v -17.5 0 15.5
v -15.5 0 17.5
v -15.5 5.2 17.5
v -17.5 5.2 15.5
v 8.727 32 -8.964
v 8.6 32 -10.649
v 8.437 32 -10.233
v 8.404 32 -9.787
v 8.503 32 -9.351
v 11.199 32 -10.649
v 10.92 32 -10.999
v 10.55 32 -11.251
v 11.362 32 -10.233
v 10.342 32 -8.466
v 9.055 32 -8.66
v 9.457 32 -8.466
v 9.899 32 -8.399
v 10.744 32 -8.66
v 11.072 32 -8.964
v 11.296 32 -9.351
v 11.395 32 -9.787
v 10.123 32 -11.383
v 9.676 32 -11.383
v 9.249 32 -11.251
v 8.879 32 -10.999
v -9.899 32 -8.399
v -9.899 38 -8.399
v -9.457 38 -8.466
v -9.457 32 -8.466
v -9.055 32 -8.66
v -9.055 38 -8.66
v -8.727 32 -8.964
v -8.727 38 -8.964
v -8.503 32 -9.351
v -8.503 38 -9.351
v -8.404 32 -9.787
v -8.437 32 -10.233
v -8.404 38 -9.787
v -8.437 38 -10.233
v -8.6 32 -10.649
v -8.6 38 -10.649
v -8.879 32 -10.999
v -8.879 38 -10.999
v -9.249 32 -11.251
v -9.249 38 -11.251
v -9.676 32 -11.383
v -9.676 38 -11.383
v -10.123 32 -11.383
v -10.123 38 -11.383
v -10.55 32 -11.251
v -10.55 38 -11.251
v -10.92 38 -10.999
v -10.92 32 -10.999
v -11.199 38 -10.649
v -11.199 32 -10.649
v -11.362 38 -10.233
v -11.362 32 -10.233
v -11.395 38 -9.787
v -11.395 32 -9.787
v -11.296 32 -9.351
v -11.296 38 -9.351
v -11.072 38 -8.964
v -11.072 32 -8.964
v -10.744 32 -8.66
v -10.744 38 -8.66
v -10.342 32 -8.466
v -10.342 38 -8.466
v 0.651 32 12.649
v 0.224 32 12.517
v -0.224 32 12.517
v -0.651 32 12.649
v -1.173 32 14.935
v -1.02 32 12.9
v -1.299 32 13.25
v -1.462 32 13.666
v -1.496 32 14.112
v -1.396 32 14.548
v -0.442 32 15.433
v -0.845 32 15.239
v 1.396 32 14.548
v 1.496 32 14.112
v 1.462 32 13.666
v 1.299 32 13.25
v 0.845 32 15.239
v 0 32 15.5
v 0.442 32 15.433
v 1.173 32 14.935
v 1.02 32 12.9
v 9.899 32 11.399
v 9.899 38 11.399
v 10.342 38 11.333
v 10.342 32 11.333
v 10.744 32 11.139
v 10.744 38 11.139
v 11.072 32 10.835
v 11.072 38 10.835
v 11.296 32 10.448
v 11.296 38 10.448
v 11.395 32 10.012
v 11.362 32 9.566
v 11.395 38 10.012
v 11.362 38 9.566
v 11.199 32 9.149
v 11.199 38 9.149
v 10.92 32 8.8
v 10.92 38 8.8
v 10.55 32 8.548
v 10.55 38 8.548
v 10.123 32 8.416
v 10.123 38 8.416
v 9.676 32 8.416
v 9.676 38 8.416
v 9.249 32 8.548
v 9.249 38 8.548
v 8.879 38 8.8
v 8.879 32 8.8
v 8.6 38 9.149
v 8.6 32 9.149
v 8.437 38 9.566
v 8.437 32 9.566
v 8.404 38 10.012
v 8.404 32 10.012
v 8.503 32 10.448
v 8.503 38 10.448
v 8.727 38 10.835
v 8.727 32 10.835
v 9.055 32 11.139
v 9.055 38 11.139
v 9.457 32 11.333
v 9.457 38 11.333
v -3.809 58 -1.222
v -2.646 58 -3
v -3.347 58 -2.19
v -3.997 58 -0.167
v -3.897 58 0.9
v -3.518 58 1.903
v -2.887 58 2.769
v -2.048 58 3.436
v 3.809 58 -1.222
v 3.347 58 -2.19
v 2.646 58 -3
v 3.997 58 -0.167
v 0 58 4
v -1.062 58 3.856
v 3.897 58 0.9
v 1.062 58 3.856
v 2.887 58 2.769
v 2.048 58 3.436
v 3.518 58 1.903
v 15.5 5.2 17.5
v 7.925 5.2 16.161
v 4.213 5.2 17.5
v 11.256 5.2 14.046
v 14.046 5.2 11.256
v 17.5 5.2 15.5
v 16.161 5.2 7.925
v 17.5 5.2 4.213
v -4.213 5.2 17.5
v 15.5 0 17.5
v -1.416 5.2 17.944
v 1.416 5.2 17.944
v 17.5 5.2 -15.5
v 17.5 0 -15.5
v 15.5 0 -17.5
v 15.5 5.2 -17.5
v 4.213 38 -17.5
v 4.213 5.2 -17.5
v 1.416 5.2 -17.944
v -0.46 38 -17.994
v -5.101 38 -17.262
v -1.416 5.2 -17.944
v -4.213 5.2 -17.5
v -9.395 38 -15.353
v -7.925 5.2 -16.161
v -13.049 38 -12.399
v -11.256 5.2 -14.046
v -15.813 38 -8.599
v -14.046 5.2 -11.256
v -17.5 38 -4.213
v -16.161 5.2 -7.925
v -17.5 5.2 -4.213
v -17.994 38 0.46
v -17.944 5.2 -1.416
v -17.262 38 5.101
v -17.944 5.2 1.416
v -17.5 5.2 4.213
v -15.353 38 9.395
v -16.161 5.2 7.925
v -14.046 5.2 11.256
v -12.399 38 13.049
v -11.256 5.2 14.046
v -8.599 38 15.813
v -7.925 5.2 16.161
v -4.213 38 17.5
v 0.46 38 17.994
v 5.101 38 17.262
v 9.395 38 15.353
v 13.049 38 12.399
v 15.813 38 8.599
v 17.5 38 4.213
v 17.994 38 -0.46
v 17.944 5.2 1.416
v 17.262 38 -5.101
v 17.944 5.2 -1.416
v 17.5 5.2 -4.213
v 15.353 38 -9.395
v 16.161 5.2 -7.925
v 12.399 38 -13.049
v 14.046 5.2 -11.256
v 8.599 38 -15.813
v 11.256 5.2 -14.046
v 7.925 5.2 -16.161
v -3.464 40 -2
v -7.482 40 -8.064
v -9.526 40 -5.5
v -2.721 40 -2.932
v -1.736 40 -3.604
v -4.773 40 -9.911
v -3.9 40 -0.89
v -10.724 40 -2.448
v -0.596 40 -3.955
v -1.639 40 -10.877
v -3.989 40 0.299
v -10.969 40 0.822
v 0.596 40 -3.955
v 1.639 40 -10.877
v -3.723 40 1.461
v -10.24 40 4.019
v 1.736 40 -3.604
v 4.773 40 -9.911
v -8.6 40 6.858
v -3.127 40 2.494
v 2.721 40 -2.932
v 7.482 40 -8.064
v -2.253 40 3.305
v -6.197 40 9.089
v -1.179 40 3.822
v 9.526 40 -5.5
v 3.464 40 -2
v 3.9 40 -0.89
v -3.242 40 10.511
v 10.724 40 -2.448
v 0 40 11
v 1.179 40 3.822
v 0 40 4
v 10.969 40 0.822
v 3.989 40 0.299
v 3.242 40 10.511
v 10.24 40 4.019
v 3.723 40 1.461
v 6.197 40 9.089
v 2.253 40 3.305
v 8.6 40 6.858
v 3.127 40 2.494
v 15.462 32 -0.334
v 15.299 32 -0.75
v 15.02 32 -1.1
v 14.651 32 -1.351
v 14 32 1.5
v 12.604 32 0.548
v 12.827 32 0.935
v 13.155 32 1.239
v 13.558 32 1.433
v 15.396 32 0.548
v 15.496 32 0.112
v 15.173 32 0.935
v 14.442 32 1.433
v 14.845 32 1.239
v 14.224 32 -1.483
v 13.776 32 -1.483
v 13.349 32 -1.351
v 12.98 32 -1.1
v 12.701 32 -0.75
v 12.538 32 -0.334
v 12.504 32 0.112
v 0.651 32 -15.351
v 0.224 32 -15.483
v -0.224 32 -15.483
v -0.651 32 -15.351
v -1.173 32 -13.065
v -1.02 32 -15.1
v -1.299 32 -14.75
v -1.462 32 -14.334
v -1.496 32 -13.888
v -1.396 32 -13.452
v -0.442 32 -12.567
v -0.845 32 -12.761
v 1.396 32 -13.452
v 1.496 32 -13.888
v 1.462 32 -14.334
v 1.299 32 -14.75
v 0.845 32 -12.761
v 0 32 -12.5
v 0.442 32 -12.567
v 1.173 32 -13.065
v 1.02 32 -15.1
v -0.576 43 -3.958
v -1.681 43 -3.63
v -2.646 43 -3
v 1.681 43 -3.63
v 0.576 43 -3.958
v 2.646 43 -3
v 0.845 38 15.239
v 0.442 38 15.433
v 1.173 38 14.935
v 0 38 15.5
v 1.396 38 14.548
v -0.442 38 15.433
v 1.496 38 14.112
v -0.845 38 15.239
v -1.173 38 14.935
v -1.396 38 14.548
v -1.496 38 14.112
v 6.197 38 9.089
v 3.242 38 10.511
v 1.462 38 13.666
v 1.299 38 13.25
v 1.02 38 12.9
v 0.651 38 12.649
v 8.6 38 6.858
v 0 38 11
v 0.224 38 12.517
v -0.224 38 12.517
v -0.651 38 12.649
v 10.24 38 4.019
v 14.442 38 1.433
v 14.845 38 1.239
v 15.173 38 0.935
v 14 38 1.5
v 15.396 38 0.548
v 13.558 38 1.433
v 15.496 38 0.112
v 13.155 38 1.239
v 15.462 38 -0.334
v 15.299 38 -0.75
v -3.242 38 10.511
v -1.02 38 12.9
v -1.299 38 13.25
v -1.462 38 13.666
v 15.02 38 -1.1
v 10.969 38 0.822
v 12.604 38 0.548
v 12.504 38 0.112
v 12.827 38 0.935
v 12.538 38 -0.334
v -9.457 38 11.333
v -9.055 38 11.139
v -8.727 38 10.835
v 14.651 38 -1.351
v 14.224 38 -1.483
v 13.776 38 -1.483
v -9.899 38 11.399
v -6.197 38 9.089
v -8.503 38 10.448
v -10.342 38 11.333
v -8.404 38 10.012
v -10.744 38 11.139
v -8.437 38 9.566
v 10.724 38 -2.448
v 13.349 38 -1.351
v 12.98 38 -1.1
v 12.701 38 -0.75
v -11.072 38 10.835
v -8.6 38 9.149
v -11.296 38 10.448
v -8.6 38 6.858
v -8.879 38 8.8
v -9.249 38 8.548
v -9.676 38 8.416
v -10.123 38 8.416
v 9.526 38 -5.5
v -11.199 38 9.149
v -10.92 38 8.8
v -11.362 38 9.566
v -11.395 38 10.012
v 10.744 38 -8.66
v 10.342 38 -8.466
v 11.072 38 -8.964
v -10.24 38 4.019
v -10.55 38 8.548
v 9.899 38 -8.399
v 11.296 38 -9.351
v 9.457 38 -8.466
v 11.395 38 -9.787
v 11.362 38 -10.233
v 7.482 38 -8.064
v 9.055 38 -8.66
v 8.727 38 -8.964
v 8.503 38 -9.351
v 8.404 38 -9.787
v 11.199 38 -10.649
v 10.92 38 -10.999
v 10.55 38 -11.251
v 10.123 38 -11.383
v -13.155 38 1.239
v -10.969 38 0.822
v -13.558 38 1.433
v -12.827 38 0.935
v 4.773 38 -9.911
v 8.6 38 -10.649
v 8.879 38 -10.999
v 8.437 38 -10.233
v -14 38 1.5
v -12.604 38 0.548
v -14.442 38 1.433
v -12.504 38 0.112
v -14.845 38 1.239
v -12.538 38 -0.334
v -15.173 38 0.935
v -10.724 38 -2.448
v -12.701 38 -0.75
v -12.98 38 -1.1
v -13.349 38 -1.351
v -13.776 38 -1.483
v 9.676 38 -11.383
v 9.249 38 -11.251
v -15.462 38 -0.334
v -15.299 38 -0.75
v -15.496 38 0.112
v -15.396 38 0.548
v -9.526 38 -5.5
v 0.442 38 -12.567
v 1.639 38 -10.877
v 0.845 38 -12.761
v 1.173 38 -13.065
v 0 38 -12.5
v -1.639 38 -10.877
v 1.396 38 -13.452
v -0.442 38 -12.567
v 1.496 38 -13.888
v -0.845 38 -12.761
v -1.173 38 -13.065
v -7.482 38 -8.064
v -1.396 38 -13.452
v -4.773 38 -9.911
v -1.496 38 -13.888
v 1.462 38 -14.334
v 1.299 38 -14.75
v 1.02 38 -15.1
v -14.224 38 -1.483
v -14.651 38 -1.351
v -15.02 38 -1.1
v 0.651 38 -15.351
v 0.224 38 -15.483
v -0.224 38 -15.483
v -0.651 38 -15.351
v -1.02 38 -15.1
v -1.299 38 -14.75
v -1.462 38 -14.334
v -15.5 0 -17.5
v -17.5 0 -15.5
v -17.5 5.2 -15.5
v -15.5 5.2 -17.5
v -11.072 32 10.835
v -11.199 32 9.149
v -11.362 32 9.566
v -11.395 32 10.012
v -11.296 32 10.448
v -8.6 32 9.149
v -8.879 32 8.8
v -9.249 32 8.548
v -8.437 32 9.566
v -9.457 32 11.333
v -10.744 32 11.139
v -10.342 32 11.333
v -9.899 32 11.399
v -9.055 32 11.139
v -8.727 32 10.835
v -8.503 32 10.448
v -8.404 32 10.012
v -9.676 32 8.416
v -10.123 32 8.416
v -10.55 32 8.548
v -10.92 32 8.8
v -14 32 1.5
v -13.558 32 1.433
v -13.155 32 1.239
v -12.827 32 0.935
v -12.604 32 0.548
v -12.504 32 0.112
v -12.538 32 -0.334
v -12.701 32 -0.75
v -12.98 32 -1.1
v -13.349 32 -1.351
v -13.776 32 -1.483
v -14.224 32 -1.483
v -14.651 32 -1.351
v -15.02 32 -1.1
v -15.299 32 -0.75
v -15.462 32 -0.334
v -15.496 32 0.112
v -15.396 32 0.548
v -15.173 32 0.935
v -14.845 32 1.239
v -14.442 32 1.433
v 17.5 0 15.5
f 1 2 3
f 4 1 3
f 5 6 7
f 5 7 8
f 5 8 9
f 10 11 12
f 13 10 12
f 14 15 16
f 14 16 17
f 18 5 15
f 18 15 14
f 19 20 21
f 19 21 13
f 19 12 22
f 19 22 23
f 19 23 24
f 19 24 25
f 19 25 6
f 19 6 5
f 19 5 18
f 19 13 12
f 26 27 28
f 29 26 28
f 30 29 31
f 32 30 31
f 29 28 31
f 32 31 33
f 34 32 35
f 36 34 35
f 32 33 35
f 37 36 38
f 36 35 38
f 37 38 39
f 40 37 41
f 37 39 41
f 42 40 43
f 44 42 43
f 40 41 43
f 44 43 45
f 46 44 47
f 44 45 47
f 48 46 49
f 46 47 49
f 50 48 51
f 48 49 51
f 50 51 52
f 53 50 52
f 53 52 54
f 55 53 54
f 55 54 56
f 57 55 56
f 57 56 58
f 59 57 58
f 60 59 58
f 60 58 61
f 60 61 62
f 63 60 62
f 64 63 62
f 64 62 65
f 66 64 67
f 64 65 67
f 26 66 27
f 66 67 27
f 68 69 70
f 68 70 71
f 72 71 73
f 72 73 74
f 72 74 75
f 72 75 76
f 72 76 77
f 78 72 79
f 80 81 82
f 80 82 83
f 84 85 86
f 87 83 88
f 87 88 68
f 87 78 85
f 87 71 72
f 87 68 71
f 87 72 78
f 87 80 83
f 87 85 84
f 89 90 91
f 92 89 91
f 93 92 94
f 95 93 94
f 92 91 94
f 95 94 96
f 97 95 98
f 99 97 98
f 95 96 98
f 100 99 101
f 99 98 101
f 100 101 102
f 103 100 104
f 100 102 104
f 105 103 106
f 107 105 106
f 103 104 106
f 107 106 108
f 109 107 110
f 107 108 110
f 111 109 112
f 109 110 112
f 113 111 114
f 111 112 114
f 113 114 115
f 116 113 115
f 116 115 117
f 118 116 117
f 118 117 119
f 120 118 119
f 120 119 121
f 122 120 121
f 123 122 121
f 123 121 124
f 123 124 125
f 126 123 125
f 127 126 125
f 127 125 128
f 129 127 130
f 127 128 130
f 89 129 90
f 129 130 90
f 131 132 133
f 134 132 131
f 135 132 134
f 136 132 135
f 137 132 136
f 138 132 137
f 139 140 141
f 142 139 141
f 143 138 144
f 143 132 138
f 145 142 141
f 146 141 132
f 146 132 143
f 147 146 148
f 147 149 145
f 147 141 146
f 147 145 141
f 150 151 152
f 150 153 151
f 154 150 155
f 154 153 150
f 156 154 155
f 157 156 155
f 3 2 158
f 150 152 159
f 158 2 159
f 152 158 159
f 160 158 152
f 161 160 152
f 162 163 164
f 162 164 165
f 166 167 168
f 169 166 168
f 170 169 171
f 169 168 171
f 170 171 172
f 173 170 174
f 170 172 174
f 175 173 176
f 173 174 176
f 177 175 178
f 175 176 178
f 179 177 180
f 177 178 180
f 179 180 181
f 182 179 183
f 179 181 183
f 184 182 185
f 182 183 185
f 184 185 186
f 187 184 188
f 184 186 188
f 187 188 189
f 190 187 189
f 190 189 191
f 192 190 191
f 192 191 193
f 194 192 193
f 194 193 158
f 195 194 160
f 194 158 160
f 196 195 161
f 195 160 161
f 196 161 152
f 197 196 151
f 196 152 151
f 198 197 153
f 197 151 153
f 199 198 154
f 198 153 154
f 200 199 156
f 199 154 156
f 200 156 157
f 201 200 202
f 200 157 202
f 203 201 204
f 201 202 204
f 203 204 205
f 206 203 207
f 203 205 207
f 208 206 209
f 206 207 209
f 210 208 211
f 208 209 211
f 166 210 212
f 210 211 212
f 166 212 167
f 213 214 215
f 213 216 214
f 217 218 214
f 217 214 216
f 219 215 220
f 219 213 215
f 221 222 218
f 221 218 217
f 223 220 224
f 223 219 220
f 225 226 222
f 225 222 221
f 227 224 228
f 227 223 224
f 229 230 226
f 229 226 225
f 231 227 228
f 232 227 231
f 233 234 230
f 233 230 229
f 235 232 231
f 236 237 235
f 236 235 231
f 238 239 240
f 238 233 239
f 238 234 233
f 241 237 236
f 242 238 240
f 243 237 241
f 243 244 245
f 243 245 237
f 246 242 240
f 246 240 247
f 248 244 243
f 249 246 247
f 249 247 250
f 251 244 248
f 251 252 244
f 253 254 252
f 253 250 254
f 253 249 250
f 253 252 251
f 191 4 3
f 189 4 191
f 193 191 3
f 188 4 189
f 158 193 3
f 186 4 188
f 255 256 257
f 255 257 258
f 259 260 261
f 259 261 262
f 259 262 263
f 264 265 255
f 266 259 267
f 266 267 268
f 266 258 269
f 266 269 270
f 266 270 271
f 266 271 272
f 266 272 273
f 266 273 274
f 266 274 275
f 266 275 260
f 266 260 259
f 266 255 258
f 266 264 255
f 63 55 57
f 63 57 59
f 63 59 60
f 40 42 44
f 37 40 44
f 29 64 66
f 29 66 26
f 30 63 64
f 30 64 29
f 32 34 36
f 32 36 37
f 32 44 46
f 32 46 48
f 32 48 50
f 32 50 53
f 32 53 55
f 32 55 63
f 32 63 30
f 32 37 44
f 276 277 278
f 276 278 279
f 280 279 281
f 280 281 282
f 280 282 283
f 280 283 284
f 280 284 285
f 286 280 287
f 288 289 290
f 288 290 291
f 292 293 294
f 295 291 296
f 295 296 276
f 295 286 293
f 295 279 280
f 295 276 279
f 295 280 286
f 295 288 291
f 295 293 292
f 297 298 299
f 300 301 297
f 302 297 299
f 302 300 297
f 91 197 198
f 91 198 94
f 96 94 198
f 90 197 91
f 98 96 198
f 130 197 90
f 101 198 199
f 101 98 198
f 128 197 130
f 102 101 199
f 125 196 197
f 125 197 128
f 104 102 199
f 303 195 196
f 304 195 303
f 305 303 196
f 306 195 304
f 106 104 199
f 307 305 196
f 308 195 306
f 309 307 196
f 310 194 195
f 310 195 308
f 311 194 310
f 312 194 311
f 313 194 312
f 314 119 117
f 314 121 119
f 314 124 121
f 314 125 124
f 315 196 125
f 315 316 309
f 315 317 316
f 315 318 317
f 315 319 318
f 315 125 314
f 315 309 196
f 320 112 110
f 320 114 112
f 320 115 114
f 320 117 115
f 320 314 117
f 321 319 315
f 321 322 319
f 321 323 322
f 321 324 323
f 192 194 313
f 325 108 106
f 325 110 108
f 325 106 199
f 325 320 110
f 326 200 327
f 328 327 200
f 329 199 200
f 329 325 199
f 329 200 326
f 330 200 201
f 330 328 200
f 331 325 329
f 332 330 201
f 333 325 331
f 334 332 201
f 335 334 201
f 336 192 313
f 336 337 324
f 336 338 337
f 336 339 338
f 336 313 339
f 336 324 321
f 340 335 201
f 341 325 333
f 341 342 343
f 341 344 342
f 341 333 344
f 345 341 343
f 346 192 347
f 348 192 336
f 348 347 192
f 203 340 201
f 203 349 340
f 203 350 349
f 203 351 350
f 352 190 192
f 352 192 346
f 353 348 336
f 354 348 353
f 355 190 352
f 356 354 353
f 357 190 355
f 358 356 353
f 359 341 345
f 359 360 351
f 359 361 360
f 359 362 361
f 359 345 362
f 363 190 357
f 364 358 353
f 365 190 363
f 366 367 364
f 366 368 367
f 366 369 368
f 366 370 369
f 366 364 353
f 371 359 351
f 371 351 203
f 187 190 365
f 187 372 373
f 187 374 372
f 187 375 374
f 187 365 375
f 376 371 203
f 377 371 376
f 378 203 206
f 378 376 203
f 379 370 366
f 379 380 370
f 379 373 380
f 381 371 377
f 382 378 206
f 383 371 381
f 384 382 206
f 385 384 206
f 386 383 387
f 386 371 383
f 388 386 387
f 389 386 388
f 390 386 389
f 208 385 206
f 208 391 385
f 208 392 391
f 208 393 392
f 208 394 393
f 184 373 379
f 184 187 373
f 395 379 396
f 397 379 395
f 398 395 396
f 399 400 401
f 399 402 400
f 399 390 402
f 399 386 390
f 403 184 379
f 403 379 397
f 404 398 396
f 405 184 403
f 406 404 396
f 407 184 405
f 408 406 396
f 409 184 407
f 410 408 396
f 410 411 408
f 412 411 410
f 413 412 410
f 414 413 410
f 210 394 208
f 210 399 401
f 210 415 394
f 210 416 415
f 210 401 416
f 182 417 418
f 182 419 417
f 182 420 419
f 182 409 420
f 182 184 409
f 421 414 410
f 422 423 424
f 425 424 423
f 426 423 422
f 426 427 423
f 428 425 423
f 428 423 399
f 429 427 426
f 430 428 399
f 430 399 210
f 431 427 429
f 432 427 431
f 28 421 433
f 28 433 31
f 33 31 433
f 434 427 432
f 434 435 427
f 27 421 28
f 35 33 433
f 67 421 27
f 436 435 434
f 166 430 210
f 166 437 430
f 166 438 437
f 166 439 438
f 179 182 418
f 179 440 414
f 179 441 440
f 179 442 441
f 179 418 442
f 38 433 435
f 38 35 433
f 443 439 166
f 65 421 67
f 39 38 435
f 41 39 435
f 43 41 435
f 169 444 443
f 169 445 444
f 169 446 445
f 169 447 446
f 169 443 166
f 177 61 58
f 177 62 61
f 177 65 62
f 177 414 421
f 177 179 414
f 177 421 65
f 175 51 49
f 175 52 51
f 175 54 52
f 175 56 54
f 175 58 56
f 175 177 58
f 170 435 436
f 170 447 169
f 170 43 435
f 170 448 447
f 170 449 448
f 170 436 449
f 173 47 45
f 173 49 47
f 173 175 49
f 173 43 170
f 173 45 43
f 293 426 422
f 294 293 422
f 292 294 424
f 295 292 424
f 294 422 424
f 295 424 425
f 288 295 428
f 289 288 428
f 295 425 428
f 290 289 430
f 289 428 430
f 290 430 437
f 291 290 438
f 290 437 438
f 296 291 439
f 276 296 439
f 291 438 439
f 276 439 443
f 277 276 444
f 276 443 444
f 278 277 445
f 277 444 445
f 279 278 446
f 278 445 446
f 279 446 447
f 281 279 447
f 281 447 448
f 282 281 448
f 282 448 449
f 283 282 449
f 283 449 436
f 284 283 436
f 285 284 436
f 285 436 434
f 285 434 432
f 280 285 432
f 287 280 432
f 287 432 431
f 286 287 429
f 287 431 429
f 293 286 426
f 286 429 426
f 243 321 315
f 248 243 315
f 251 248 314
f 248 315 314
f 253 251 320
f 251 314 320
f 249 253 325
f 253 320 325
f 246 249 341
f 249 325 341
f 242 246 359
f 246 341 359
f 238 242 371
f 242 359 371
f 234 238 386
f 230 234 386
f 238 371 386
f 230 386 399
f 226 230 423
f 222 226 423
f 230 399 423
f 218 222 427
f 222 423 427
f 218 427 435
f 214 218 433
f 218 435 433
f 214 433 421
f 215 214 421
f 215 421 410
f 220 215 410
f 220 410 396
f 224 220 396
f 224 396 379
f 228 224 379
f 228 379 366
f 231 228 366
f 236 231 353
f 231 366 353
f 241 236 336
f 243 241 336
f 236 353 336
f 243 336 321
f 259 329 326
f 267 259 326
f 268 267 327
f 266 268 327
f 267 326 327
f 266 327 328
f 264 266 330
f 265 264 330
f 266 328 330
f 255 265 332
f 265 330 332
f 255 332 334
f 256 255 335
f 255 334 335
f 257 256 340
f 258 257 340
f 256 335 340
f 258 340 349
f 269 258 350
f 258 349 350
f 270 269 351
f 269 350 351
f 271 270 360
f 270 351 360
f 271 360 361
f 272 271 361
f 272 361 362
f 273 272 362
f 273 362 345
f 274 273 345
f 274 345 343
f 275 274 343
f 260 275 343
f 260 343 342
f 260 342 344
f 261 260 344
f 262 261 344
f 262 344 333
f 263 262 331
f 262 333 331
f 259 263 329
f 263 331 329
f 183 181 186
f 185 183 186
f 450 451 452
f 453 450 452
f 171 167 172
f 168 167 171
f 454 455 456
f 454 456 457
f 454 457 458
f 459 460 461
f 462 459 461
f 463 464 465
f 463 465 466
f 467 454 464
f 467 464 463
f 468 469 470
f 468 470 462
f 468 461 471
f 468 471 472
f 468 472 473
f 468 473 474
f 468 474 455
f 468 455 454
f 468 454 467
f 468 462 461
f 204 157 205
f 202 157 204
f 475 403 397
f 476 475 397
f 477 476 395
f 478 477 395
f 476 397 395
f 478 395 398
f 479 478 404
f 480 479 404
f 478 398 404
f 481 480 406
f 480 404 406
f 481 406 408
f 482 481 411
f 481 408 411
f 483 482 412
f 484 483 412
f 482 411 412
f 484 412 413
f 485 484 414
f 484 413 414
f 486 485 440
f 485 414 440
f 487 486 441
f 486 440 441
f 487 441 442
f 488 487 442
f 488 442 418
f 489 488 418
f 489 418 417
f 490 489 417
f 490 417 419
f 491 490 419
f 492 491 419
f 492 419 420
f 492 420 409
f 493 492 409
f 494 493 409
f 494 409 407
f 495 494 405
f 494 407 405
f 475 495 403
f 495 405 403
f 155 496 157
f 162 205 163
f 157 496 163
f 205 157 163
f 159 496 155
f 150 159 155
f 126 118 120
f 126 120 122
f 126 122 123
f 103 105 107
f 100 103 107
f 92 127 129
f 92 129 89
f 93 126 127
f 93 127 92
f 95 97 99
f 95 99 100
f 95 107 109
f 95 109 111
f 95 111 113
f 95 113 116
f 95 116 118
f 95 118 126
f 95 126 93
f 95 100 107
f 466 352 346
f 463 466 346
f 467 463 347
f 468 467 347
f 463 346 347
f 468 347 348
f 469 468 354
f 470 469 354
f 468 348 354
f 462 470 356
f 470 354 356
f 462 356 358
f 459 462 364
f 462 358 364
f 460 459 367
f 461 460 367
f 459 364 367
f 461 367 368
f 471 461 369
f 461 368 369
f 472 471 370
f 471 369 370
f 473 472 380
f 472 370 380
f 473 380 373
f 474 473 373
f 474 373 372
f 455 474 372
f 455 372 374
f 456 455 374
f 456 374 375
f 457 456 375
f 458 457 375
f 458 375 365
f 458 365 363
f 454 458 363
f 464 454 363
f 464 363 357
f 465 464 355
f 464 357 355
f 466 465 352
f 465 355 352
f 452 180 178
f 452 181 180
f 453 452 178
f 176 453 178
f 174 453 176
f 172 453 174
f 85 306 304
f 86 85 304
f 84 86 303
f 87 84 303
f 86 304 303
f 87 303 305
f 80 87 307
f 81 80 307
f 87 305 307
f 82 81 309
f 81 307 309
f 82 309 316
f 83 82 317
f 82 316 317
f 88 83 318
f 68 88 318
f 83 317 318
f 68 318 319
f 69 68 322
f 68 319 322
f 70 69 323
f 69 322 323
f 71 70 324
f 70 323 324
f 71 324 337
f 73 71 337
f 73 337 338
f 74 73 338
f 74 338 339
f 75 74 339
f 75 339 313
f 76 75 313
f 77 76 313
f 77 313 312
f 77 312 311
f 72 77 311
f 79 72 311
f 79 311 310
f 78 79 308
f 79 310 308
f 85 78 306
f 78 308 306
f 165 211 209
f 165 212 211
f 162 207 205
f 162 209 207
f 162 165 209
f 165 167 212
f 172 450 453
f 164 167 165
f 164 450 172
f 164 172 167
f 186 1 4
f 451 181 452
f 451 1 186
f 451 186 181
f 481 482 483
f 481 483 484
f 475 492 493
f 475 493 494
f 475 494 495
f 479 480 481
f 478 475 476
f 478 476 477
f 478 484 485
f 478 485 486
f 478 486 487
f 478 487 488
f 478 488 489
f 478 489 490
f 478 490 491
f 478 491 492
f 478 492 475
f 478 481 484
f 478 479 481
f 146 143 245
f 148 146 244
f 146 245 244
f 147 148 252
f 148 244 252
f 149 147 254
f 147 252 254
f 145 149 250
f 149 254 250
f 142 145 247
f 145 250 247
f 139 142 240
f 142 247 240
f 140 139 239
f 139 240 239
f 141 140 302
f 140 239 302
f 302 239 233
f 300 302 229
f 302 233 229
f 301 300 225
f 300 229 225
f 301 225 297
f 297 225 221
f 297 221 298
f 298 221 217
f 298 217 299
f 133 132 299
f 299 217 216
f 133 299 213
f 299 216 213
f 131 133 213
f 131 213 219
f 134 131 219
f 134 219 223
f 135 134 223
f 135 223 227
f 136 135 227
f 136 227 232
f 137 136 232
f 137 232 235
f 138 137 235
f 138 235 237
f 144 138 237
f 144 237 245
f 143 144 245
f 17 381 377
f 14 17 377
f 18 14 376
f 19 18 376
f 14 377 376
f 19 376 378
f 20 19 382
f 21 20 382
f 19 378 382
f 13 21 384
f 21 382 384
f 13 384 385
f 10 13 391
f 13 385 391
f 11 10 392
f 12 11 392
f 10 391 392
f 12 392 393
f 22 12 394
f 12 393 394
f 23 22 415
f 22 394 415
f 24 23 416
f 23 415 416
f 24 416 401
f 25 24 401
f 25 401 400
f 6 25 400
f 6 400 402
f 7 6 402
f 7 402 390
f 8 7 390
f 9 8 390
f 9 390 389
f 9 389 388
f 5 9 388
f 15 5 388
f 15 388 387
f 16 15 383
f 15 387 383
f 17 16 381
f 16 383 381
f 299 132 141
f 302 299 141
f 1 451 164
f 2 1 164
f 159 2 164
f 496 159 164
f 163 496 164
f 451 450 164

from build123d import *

# Parameters (mm, degrees)
SKETCH_1_W          = 35
SKETCH_1_H          = 35
EXTRUDE_1_DEPTH     = 5.2
SKETCH_2_R          = 18
EXTRUDE_2_DEPTH     = 32.8
SKETCH_3_R          = 11
EXTRUDE_3_DEPTH     = 2
SKETCH_4_R          = 4
EXTRUDE_4_DEPTH     = 18
SKETCH_5_W          = 10.54681648
SKETCH_5_H          = 7.766292135
CUT_EXTRUDE_1_DEPTH = 15
CHAMFER_1_SIZE      = 2
SKETCH_6_R          = 1.5
CUT_EXTRUDE_2_DEPTH = 6
SKETCH_7_R          = 1.5
CUT_EXTRUDE_3_DEPTH = 6


with BuildPart() as part:
    # 草图1 → 凸台-拉伸1 (new body)
    with BuildSketch(Plane(origin=(0, 0, 0), x_dir=(1, 0, 0), z_dir=(0, 1, 0))):
        Rectangle(SKETCH_1_W, SKETCH_1_H)
    extrude(amount=EXTRUDE_1_DEPTH)

    # 草图2 → 凸台-拉伸2 (add)
    with BuildSketch(Plane(origin=(0, 5.2, 0), x_dir=(1, 0, 0), z_dir=(0, 1, 0))):
        with Locations(Location((0, 0, 0), (0, 0, 76.463797263))):
            Circle(SKETCH_2_R)
    extrude(amount=EXTRUDE_2_DEPTH)

    # 草图3 → 凸台-拉伸3 (add)
    with BuildSketch(Plane(origin=(0, 38, 0), x_dir=(1, 0, 0), z_dir=(0, 1, 0))):
        with Locations(Location((0, 0, 0), (0, 0, 270))):
            Circle(SKETCH_3_R)
    extrude(amount=EXTRUDE_3_DEPTH)

    # 草图4 → 凸台-拉伸4 (add)
    with BuildSketch(Plane(origin=(0, 40, 0), x_dir=(1, 0, 0), z_dir=(0, 1, 0))):
        with Locations(Location((0, 0, 0), (0, 0, 270))):
            Circle(SKETCH_4_R)
    extrude(amount=EXTRUDE_4_DEPTH)

    # 草图5 → 切除-拉伸1 (cut)
    with BuildSketch(Plane(origin=(0, 58, 0), x_dir=(1, 0, 0), z_dir=(0, 1, 0))):
        with Locations((0, 6.883146068)):
            Rectangle(SKETCH_5_W, SKETCH_5_H)
    extrude(amount=-CUT_EXTRUDE_1_DEPTH, mode=Mode.SUBTRACT)

    # 倒角1
    chamfer_1_edges = [part.edges().sort_by_distance(p)[0] for p in [
        (17.5, 2.6, 17.5),
        (-17.5, 2.6, 17.5),
        (-17.5, 2.6, -17.5),
        (17.5, 2.6, -17.5),
    ]]
    chamfer(chamfer_1_edges, length=CHAMFER_1_SIZE)

    # 草图6 → 切除-拉伸2 (cut)
    with BuildSketch(Plane(origin=(0, 38, 0), x_dir=(1, 0, 0), z_dir=(0, 1, 0))):
        with Locations(Location((0, 14, 0), (0, 0, 270))):
            Circle(SKETCH_6_R)
        with Locations(Location((14, 0, 0), (0, 0, 270))):
            Circle(SKETCH_6_R)
        with Locations(Location((0, -14, 0), (0, 0, 270))):
            Circle(SKETCH_6_R)
        with Locations(Location((-14, 0, 0), (0, 0, 270))):
            Circle(SKETCH_6_R)
    extrude(amount=-CUT_EXTRUDE_2_DEPTH, mode=Mode.SUBTRACT)

    # 草图7 → 切除-拉伸3 (cut)
    with BuildSketch(Plane(origin=(0, 38, 0), x_dir=(1, 0, 0), z_dir=(0, 1, 0))):
        with Locations(Location((-9.899494937, 9.899494937, 0), (0, 0, 270))):
            Circle(SKETCH_7_R)
        with Locations(Location((9.899494937, 9.899494937, 0), (0, 0, 270))):
            Circle(SKETCH_7_R)
        with Locations(Location((9.899494937, -9.899494937, 0), (0, 0, 270))):
            Circle(SKETCH_7_R)
        with Locations(Location((-9.899494937, -9.899494937, 0), (0, 0, 270))):
            Circle(SKETCH_7_R)
    extrude(amount=-CUT_EXTRUDE_3_DEPTH, mode=Mode.SUBTRACT)


solid = part.part
